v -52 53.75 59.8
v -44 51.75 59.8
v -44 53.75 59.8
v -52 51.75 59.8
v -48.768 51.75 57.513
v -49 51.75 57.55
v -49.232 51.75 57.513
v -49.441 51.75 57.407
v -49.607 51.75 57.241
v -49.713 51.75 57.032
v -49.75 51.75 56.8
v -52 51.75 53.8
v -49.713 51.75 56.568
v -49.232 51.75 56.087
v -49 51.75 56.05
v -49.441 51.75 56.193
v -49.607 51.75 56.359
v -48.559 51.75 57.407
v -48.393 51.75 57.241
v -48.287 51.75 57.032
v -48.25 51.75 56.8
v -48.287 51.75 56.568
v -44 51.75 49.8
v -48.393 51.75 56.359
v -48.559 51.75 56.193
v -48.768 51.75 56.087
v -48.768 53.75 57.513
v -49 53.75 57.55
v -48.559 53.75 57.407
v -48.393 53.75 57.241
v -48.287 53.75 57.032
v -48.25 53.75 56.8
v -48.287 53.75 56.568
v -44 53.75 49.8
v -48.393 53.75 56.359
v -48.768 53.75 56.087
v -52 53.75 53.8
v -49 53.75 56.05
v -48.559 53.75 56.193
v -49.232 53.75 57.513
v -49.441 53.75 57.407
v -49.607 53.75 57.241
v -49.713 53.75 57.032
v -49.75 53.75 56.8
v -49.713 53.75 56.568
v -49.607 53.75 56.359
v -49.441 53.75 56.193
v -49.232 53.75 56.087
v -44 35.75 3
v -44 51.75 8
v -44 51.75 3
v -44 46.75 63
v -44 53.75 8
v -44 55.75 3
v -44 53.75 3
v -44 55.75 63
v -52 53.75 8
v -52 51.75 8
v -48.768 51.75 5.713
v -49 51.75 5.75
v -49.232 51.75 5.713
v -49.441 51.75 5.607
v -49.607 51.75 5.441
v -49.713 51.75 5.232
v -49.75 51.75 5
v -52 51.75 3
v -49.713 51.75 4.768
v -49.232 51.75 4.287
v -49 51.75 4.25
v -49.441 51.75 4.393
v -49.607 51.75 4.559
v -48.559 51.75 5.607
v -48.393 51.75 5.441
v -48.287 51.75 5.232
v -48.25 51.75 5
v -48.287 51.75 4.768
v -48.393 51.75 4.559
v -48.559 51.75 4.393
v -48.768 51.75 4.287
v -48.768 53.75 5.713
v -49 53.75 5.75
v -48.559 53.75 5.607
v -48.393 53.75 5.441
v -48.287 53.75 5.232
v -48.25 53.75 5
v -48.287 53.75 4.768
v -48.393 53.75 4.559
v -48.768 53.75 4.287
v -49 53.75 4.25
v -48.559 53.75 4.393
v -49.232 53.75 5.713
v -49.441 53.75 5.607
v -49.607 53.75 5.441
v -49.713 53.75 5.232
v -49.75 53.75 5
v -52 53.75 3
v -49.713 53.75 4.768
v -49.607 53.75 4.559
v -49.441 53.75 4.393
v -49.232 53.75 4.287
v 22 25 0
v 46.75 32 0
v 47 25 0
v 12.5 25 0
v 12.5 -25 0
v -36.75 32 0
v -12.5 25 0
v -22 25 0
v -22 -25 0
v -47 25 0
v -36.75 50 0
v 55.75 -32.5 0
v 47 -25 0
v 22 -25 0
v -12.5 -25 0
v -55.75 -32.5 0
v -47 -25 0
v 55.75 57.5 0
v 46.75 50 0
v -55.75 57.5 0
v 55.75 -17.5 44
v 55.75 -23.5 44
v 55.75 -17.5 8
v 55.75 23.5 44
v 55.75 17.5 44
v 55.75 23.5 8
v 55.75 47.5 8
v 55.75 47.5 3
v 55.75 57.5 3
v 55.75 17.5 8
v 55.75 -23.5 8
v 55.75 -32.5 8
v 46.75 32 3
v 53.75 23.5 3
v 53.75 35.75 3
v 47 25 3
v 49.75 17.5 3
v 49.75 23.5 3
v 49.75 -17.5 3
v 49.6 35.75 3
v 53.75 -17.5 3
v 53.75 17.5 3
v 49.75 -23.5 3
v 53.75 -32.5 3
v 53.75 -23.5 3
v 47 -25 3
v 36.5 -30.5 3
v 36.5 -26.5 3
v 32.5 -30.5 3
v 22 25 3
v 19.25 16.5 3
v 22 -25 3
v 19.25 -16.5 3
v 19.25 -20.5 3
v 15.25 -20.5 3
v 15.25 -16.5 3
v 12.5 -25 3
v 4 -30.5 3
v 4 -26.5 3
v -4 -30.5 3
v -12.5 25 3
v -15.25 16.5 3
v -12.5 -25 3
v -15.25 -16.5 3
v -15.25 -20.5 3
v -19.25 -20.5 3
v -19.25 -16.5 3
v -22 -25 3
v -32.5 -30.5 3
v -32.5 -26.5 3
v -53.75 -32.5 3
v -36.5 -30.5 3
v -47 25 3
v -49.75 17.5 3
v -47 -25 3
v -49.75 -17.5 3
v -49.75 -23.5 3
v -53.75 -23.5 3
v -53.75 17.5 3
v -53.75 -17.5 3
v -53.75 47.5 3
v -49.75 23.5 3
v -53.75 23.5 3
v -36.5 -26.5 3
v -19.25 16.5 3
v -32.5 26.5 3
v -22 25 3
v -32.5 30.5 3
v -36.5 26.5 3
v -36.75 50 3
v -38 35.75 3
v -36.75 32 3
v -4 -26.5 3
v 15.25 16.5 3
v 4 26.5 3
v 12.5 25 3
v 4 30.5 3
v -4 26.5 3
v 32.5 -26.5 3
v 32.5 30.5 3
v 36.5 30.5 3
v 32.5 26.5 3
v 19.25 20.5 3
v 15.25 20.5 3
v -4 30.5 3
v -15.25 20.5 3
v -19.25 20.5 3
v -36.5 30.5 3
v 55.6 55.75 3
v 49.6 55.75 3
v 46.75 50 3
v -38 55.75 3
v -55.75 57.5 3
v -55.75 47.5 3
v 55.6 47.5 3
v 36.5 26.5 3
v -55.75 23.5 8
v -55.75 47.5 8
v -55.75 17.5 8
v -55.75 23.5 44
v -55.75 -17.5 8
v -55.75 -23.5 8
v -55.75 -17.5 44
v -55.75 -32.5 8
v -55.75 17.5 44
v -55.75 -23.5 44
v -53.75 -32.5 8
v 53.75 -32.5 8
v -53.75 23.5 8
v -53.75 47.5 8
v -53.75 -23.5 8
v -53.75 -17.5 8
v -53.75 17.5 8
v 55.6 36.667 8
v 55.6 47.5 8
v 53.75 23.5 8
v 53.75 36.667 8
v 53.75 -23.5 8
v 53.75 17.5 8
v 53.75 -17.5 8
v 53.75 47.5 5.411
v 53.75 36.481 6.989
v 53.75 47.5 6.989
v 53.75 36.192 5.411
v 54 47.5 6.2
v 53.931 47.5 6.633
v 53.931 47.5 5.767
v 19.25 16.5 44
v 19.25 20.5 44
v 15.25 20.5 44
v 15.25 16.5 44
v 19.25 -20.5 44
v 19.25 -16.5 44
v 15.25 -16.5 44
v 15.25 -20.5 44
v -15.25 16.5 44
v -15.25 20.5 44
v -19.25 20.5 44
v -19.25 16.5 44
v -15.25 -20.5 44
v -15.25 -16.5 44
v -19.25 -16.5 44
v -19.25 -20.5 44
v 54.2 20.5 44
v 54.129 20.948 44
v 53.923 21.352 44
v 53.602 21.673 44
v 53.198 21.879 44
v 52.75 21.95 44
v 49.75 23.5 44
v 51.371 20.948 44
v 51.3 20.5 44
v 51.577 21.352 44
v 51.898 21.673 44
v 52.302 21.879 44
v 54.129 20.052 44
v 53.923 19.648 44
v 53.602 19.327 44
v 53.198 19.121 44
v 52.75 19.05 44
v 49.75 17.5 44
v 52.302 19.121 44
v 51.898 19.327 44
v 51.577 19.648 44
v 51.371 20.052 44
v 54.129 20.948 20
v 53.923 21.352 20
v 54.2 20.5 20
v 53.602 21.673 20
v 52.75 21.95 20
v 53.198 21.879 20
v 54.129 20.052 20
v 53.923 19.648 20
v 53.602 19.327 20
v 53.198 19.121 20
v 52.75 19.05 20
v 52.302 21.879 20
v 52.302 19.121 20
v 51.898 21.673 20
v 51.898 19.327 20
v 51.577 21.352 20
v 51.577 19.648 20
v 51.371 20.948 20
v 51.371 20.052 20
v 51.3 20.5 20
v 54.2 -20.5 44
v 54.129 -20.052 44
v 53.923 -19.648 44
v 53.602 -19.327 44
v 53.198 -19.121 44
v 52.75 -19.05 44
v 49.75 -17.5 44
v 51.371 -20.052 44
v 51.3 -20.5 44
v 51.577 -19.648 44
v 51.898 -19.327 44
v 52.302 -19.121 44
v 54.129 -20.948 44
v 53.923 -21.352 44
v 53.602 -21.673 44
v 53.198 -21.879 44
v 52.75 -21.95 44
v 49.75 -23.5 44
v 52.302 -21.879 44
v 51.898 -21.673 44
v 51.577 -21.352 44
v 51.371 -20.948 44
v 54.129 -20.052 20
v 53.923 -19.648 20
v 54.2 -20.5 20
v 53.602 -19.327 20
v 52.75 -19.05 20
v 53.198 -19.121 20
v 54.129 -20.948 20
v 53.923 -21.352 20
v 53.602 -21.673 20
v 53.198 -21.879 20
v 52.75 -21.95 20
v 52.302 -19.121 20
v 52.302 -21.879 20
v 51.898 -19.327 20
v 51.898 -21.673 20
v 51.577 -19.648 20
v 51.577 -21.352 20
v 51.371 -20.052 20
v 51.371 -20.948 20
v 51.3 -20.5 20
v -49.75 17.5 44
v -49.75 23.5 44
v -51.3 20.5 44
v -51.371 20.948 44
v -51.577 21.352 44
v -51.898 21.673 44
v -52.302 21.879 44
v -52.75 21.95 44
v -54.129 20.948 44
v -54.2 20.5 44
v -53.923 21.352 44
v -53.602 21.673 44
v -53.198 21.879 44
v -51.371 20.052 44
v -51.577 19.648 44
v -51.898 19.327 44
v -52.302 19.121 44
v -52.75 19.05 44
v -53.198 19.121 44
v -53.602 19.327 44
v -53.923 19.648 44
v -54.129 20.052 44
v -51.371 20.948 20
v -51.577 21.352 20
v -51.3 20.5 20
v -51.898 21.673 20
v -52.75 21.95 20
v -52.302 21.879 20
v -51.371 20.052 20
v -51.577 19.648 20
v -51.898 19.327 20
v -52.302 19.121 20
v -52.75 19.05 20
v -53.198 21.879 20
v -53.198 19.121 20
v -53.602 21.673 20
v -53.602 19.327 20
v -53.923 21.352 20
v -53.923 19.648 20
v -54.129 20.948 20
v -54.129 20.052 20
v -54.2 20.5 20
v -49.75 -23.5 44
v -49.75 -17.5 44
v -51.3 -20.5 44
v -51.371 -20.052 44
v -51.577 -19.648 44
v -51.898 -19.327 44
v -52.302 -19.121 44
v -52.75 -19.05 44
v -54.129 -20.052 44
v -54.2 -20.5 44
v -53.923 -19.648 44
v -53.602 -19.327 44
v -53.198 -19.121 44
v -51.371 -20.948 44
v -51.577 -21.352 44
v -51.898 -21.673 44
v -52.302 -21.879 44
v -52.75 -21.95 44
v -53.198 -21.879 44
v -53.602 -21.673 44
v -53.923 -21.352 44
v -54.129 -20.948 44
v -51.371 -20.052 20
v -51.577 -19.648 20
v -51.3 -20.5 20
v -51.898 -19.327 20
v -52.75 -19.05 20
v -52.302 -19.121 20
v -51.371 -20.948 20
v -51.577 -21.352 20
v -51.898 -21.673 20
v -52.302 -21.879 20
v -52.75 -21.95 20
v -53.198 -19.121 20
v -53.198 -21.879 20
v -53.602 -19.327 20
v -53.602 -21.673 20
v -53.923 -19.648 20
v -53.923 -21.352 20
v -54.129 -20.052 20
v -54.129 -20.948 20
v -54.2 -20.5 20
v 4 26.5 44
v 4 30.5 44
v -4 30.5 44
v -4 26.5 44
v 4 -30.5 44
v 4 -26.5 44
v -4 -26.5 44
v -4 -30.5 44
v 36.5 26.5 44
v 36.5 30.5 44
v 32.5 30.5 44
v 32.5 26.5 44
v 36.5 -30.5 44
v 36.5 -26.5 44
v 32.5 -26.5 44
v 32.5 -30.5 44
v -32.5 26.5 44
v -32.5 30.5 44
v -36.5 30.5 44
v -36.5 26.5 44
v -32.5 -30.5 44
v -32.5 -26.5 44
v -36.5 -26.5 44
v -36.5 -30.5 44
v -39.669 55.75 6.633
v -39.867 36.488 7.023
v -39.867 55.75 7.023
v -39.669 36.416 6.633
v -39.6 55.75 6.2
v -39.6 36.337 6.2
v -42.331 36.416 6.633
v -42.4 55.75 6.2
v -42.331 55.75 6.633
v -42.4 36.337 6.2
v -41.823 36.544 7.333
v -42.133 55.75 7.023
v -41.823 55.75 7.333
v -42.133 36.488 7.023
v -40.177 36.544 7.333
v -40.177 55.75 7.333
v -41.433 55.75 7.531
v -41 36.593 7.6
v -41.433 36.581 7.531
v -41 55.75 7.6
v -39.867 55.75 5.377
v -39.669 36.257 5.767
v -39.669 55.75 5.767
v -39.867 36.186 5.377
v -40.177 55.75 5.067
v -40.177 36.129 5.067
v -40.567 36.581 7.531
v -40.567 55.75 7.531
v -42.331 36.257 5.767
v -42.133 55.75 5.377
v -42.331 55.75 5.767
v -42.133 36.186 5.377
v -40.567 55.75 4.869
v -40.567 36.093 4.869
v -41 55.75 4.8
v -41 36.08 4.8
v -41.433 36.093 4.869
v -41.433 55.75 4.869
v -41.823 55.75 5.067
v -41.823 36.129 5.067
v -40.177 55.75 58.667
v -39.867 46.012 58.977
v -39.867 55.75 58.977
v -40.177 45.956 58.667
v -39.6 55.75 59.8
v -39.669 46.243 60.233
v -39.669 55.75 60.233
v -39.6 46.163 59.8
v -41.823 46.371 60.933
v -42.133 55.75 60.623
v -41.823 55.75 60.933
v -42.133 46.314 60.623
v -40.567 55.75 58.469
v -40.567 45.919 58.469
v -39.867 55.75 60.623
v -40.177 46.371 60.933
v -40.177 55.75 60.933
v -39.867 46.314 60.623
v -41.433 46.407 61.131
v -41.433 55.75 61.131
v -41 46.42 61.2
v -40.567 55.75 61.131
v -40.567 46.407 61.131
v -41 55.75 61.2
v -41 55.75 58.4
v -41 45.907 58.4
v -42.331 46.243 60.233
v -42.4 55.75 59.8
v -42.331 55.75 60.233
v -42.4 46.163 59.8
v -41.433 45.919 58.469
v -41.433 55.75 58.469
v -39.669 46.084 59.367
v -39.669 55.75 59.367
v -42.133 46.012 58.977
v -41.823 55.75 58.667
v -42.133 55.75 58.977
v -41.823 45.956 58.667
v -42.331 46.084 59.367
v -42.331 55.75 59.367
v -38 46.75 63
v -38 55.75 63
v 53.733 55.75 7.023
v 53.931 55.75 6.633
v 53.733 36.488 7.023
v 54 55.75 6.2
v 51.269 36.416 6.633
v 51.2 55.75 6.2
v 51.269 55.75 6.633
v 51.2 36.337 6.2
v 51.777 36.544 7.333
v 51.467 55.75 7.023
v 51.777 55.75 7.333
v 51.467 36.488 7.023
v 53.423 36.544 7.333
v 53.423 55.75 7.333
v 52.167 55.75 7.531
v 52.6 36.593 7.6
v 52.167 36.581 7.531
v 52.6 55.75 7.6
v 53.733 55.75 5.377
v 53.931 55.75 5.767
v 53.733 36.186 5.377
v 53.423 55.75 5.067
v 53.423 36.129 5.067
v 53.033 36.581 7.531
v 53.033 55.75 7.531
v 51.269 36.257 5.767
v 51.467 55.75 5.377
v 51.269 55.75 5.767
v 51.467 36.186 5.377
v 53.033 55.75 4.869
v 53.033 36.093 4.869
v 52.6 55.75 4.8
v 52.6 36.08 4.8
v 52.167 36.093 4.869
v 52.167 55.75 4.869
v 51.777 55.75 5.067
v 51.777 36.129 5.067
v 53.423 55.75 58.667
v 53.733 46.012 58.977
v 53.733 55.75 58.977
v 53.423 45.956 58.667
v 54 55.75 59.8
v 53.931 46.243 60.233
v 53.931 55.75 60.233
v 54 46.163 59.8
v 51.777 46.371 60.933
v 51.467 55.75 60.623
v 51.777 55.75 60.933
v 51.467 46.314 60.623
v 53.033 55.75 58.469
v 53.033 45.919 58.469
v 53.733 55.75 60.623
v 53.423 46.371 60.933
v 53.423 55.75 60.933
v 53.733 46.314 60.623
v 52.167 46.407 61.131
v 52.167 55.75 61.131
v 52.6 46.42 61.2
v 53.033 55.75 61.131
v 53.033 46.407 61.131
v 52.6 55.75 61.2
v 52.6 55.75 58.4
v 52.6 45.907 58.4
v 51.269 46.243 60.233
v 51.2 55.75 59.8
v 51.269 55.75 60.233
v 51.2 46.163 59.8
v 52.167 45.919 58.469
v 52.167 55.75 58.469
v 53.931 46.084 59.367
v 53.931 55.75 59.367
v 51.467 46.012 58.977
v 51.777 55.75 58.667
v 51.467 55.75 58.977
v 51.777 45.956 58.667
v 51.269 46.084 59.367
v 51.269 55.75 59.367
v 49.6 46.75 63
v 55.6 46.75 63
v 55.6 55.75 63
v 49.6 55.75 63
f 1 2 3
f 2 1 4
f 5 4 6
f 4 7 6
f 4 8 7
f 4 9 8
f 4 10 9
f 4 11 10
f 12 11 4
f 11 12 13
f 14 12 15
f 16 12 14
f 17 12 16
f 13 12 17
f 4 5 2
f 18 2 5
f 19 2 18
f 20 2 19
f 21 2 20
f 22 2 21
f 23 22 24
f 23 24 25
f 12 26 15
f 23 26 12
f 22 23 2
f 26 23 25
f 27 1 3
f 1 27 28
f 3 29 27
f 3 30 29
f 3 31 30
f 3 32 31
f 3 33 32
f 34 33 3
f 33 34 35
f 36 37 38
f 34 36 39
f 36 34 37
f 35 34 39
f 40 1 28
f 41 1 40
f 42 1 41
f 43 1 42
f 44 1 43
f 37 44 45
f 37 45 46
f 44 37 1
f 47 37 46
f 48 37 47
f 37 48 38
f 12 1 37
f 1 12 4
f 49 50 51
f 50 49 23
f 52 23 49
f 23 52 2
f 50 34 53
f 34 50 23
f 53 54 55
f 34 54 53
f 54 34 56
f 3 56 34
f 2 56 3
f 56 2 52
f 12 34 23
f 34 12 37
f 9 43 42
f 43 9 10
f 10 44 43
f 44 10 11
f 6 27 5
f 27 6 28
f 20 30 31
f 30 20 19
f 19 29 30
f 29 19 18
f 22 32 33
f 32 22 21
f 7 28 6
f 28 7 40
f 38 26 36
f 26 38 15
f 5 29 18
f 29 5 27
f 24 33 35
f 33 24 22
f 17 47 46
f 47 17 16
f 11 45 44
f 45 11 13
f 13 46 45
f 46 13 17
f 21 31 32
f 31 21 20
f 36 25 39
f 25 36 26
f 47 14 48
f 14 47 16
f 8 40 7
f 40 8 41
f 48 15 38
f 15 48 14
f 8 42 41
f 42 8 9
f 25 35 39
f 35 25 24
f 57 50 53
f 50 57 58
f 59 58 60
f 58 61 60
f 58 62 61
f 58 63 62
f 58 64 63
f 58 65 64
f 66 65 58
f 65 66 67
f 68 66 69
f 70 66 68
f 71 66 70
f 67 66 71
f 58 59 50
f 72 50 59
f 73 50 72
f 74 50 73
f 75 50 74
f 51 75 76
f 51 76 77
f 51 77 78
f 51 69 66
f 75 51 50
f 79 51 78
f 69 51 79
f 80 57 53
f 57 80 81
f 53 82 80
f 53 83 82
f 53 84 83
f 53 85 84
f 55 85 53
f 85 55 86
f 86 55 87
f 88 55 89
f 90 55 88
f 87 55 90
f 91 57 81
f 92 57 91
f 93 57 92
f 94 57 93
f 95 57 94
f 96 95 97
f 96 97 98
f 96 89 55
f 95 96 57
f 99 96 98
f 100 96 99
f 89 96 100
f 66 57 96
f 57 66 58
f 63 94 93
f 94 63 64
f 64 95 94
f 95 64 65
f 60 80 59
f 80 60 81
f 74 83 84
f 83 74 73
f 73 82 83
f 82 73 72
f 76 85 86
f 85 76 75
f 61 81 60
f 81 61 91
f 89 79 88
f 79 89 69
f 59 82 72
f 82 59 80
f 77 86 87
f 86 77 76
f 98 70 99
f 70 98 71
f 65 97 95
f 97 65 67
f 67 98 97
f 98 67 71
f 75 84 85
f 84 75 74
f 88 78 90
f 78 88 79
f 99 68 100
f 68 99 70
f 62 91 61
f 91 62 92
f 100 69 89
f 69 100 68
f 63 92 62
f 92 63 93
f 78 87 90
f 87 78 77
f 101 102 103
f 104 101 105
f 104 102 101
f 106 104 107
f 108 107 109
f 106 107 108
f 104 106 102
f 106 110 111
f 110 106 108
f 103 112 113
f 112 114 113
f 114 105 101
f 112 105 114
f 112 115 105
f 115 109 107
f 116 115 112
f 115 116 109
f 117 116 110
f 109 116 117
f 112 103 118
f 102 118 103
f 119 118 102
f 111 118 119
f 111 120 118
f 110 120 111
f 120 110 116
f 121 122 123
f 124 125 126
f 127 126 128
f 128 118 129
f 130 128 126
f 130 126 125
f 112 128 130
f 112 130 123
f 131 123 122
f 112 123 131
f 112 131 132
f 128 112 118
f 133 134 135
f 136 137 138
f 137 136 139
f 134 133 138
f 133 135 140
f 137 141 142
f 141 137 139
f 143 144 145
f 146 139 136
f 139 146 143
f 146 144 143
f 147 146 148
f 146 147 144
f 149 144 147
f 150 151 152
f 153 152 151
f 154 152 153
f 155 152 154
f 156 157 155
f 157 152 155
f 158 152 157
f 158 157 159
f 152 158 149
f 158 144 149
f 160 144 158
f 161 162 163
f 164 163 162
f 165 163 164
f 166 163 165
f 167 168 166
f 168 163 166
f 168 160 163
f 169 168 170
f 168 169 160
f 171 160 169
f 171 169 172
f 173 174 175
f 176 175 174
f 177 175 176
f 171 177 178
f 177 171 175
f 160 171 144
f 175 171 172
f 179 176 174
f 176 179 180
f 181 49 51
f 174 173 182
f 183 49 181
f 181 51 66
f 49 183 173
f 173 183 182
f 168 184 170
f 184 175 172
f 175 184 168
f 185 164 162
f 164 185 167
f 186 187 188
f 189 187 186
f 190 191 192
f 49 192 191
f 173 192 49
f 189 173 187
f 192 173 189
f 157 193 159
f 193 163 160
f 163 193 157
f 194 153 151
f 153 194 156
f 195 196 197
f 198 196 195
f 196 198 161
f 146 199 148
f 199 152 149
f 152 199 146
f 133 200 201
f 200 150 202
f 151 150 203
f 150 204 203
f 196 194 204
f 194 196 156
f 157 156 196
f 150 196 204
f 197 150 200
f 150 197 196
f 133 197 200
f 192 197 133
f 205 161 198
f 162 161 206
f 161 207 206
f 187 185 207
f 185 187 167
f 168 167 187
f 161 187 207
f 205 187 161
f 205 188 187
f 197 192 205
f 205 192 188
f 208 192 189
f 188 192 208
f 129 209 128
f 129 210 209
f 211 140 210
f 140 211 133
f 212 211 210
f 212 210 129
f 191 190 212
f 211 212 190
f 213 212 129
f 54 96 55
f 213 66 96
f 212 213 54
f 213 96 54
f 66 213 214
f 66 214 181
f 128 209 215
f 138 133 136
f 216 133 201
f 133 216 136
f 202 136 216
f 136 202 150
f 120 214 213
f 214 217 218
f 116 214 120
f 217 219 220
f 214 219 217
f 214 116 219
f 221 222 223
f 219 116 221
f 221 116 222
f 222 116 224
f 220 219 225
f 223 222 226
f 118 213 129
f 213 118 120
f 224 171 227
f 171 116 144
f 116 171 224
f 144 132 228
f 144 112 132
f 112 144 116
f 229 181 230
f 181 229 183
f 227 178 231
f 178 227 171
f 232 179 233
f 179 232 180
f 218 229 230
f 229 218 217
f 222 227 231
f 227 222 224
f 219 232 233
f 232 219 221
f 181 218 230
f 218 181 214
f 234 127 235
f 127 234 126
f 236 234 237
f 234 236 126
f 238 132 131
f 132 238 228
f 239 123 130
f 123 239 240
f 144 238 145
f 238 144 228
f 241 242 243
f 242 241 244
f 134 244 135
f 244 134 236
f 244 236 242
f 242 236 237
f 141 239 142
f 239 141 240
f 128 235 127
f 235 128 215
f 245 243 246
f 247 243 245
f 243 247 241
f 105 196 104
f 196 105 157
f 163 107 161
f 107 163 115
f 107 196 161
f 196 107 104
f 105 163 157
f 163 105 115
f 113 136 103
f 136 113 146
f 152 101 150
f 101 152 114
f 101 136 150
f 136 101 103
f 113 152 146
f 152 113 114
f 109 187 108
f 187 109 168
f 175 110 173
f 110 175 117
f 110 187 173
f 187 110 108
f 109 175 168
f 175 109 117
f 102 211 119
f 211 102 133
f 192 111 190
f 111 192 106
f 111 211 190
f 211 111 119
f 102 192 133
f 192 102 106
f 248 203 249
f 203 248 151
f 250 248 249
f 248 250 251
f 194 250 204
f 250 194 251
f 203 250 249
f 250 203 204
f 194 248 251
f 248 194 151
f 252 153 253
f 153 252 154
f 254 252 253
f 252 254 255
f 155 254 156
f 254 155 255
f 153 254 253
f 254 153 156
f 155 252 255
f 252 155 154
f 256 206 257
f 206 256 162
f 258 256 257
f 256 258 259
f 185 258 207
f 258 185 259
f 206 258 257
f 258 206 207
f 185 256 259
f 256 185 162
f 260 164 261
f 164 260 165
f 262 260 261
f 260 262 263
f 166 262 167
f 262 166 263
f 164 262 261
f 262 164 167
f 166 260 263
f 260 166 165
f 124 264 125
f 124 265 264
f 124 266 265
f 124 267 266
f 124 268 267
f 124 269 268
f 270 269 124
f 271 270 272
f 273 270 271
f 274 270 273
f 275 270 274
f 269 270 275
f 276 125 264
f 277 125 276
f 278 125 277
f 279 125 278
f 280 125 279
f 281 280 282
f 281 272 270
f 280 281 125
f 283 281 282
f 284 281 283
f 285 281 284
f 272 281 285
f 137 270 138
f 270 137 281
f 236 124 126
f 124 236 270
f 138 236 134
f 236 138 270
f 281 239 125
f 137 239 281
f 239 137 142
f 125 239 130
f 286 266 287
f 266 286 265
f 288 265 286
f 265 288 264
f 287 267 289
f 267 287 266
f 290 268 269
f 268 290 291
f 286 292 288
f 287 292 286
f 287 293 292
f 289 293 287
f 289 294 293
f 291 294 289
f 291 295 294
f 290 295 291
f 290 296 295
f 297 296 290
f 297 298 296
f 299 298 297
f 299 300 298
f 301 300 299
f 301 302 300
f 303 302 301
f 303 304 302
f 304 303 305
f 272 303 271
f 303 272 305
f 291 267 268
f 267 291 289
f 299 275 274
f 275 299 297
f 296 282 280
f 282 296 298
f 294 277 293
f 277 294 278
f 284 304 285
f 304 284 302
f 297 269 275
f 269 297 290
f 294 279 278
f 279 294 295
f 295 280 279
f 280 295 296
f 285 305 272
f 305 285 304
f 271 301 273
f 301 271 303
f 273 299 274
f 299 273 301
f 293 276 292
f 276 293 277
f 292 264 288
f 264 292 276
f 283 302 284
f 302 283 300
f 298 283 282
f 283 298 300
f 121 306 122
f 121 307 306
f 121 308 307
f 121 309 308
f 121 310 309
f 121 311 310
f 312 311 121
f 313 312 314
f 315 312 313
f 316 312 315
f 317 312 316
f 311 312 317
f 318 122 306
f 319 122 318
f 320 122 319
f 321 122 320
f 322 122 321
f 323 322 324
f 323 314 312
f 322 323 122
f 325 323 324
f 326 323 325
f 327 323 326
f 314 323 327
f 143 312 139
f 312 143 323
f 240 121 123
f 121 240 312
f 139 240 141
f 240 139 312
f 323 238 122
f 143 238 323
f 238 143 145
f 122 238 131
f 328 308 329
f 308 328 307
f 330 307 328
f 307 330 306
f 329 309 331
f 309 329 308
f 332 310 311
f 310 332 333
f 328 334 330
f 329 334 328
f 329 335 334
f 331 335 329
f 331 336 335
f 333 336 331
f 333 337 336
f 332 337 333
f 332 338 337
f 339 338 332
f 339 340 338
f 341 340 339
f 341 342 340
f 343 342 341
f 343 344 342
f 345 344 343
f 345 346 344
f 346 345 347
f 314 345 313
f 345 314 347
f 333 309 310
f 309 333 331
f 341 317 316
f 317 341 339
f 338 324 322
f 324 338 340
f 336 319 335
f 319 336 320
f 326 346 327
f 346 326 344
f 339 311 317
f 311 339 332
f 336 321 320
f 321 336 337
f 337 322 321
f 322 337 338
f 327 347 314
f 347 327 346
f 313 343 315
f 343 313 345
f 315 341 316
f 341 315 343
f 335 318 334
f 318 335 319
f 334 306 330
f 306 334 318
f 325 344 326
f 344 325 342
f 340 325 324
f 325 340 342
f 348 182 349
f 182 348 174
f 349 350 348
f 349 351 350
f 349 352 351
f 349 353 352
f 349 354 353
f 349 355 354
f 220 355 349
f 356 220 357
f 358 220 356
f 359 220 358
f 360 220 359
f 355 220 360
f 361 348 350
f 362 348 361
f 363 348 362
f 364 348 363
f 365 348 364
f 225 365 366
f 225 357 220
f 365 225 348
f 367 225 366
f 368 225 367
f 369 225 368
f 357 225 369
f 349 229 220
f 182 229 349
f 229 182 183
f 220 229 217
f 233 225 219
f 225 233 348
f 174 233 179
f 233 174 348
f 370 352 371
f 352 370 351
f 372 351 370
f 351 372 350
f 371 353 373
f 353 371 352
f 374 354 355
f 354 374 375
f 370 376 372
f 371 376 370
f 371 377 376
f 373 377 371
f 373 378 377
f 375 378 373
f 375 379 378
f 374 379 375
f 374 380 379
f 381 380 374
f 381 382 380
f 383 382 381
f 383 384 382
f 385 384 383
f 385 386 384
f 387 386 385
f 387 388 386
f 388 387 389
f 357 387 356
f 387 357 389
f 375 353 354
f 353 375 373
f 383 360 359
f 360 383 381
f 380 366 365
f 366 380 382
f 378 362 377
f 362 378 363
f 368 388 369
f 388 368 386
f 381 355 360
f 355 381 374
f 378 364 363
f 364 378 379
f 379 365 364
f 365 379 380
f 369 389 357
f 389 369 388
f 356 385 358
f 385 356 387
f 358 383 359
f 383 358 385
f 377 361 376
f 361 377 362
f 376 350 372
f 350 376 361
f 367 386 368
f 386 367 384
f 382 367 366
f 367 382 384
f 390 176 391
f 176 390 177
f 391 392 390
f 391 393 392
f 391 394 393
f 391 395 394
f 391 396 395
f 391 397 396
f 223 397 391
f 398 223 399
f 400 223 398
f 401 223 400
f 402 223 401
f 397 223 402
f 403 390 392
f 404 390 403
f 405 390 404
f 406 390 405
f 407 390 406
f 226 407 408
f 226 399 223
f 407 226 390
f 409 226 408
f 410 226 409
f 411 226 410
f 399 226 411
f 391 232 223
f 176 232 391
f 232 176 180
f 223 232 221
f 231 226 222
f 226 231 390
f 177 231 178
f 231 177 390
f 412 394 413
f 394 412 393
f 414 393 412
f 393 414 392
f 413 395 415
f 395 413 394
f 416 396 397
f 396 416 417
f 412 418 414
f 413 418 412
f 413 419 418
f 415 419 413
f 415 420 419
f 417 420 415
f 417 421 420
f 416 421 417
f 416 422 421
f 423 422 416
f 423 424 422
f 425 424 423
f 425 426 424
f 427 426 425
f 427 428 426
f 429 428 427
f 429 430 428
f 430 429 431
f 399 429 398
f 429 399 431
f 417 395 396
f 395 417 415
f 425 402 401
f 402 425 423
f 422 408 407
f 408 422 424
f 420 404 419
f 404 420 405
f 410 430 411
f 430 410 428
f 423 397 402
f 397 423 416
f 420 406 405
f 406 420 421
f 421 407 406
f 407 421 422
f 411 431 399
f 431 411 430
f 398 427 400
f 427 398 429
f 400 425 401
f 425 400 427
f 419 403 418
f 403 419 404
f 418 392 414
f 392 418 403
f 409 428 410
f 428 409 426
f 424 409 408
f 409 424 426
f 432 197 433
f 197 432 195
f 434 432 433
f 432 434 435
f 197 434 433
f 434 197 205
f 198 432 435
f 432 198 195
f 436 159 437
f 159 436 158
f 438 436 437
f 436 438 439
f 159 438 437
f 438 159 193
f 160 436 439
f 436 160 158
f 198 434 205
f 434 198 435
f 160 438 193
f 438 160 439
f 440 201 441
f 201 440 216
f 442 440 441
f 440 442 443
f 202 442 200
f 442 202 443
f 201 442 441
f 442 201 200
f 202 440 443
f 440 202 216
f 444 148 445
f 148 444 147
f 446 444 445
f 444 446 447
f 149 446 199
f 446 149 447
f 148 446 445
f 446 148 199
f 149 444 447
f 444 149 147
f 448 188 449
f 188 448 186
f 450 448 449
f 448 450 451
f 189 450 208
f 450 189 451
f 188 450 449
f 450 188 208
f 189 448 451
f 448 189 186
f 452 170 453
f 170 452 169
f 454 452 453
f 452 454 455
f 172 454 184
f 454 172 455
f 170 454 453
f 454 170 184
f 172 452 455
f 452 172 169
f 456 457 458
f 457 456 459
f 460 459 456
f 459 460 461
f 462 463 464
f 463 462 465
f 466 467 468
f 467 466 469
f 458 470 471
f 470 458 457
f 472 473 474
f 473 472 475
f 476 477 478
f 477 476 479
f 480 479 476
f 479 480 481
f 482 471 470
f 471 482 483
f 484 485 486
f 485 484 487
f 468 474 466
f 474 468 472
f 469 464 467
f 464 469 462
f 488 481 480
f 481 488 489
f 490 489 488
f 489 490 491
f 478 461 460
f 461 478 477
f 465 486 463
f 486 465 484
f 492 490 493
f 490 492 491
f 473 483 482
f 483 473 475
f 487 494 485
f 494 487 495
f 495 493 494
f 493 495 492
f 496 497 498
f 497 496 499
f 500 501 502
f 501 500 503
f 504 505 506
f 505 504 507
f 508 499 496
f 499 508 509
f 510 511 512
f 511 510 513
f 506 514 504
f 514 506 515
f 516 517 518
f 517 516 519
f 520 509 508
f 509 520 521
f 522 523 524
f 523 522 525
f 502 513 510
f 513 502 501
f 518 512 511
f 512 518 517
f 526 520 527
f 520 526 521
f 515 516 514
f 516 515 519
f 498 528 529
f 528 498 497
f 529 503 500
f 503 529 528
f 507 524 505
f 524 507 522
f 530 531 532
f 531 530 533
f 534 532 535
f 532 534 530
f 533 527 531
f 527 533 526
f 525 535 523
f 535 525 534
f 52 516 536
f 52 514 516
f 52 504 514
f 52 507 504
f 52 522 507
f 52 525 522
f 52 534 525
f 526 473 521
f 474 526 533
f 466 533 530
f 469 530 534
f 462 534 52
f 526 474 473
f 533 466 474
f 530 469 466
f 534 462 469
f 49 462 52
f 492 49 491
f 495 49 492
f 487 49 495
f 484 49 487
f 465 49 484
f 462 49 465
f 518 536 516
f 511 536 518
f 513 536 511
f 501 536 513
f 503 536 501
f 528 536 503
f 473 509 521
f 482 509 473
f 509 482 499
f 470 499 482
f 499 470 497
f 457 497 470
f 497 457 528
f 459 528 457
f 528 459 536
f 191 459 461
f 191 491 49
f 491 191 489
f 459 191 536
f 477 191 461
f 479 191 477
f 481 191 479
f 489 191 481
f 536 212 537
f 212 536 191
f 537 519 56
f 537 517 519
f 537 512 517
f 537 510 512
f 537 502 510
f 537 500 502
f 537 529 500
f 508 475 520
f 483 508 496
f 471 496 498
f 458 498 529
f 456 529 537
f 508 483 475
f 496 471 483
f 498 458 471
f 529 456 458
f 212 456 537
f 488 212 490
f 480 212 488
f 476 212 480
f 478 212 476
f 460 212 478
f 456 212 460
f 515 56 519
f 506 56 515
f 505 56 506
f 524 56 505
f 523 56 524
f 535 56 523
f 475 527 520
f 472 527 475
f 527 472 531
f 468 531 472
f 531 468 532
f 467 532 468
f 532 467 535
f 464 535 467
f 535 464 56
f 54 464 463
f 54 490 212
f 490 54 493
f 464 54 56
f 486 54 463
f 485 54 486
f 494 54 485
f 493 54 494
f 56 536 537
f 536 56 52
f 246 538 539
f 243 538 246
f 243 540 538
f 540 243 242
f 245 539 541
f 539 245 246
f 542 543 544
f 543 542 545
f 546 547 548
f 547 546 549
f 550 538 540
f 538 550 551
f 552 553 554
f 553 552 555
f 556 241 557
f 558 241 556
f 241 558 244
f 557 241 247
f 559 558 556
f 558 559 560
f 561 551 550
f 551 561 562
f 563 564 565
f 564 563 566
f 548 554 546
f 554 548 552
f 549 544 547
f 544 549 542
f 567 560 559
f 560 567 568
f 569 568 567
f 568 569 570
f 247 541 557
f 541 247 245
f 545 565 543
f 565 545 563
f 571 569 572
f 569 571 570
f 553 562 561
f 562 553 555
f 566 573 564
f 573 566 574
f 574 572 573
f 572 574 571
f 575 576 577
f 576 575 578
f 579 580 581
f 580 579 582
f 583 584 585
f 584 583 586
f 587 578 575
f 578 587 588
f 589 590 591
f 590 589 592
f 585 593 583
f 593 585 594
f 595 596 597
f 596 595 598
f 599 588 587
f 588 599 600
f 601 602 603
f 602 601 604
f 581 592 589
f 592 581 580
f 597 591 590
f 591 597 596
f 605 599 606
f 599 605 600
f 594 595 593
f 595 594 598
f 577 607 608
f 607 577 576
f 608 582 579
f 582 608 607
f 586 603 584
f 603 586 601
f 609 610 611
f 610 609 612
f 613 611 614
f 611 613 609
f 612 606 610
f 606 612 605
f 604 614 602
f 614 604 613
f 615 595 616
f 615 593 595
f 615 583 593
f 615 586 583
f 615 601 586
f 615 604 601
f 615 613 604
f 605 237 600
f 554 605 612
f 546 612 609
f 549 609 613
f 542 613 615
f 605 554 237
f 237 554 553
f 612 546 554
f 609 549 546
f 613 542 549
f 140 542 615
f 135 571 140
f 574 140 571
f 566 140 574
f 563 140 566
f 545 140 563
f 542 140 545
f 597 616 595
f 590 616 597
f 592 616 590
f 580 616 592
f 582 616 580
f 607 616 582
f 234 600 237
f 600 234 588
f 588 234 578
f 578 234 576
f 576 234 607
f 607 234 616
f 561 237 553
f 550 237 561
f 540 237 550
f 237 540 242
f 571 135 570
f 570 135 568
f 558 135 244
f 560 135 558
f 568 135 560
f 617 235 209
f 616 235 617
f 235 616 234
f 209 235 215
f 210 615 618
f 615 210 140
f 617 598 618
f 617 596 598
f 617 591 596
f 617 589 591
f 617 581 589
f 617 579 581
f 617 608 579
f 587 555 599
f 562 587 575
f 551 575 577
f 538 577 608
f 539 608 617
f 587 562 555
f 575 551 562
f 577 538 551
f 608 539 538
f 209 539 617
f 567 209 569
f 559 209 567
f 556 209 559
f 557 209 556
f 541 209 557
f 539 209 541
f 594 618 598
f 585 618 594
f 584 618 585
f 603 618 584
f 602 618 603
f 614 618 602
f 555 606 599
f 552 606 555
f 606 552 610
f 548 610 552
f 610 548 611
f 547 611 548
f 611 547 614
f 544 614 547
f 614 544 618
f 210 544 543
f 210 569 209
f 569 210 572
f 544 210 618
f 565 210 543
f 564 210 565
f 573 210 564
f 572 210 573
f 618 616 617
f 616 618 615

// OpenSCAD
/* File: ~/GliderWinchItems/BMS/hw/proxy2.scad
  * frame for proxy pack 650 mah batteries
  * Latest edit: 20230215
 */
 
 $fn=20;
  
module rounded_rectangle_hull(wid,slen,ht,rad)
{
 hull()
 {    
    translate([-wid/2+rad,rad,0])
        cylinder(r=rad,h=ht,center=false);

   translate([ wid/2-rad,rad,0])
        cylinder(r=rad,h=ht,center=false);

    translate([-wid/2+rad,slen-rad,0])
        cylinder(r=rad,h=ht,center=false);
    
    translate([ wid/2-rad,slen-rad,0])
        cylinder(r=rad,h=ht,center=false);
 }
}
blen = 53.0; // Battery length
bwid = 30.5; // Battery width
bthk =  7.0; // Battery thickness
bipst = 4.0; // Inner posts between batterys stacks
bepst = 6.0; // End posts 
bhpst = bthk*6 + 2.0;// Post height
pcbwid = 25; // pcb mounting space

len = bwid*3 + 2*bipst + 2*bepst;
wid = blen + 2*bepst + pcbwid ;
ht = bhpst;;
wall = 3;
bot = 3;

psq = 6.0;
pht = ht - 0; // Post height
phole = 48;//54;

module post(a,xht,sq,da)
{
    translate(a)
    {
        difference()
        {
            union()
            {
                translate([0,0,xht/2])
                cube([sq,sq,xht],center = true);
            }
            union()
            {
                translate([0,0,xht-24])
                cylinder(d=da,h=25, center=false);
            }
        }
    }
}
pcboff = 3.2;    
pcby2 = 60  - pcboff;
pcby1 = pcboff;
pcbdia = 2.8;
module postpcb(a)
{

   
    translate(a)
    {
      difference()
    {
        union()
        {
          translate([0,0,bot])
          rotate([90,0,-90])
           linear_extrude(height = 6, center = true, convexity = 10, twist = 0)
             polygon(points=[[0,0],[0,60],[9,60],[20,0]]);

 
        }
        union()
        {
            translate([0,0,pcboff+bot])
            rotate([90,0,0])
            cylinder(d=pcbdia,h=100,center=true);
            
            translate([0,0,pcboff+bot+(60-2*pcboff)])
            rotate([90,0,0])
            cylinder(d=pcbdia,h=100,center=true);
            

        }
    }
}
}

module box()
{
    del1 = 2.8;
    difference()
    {
        union()
        {
            translate([0,pcbwid/2,bot/2])
            cube([len,wid,bot],center = true);
            
            translate([-len/2+1,7.5,8/2])
            cube([2,80,8],center=true);
            
            translate([ len/2-1,7.5,8/2])
            cube([2,80,8],center=true);
 
        }
        union()
        {
            qlen = 25; qwid = 50;
           translate([0,0,0])
            cube([qlen,qwid,100],center = true); 
           translate([bwid*1+bipst,0,0])
            cube([qlen,qwid,100],center = true);  
            translate([-(bwid*1+bipst),0,0])
            cube([qlen,qwid,100],center = true); 
  
            rlen = len-28; rwid = 18;
            translate([5,wid/2-4,0])
            cube([rlen,rwid,100],center = true); 
            
 
        }
    }
}
pdel = 6;
poff = bwid/2 + bipst/2;
py2 = blen/2 - bipst/2 - pdel;
px3 = bwid*1.5 + bipst + bepst/2;
py3 = blen/2 -pdel;
px4 = 0 + bipst/2;
py4 = blen/2 + bipst/2;

module boxNpost()
{
box();
post([ poff, py2,0],pht,bipst,0);
post([ poff,-py2,0],pht,bipst,0);
post([-poff, py2,0],pht,bipst,0);
post([-poff,-py2,0],pht,bipst,0);

post([ px3, py3,0],ht,bepst,2.9);
post([ px3,-py3,0],ht,bepst,2.9);
post([-px3, py3,0],ht,bepst,2.9);
post([-px3,-py3,0],ht,bepst,2.9);

post([ px4, py4,0],ht,bipst,0);
post([ px4,-py4,0],ht,bipst,0);
post([-px4, py4,0],ht,bipst,0);
post([-px4,-py4,0],ht,bipst,0);

px5 = bwid* 1 + bipst; 
post([ px5, py4,0],ht,bipst,0);
post([ px5,-py4,0],ht,bipst,0);
post([-px5, py4,0],ht,bipst,0);
post([-px5,-py4,0],ht,bipst,0);
}

module senseRtab(a,dd,rr)
{
    zh = 2;
    z2 = 8;
    z1 = z2+zh;    
    z3 = z2/2;
    translate(a)
    {
      rotate([0,0, rr])
      rotate([90,0,0])
      rotate([0,90,0])
      {
        difference()
        {
        union()
        {
          linear_extrude(height = zh, center = false, convexity = 10, twist = 0)
          polygon(points=[[0,0],[0,z1],[z2,z1],[z2,z3]]);
        }
        union()
        {
            translate([z2/2+1,z1-3,0])
            cylinder(d=dd,h=50,center=true);
        }
       }
     }
    }
}
frame = 1;
if (frame==1)
{

// 0.1 ohm current sense resistor mounting tabs
senseRtab([-50+9-3,len/2-2-2,pcboff+bot+(60-2*pcboff-10)],1.5,90);
difference()
{    
  senseRtab([-50+9-3,len/2-2-2,-2],1.5,90);
  translate([0,0,-1])cube([200,200,2],center=true);
}

boxNpost();

translate([-50+9,len/2,0])
union()
{
  postpcb([  0,0,0]);
  postpcb([(100-2*pcboff),0,0]);
}
}

module clamp()
{
 del2 = -5;
    cht = 5;
 difference()
 {
     union()
     {
        translate([0,0,ht/2])
        cube([2*(px3+2.9),2*(py3+2.9),cht],center = true);
     }
     union()
     {
       cube([2*(px3-2.9),2*(py3-2.9),50],center = true);
         
       translate([ px3, py3,0]) cylinder(d=3.2,h=60);       
       translate([-px3, py3,0]) cylinder(d=3.2,h=60);       
       translate([ px3,-py3,0]) cylinder(d=3.2,h=60);       
       translate([-px3,-py3,0]) cylinder(d=3.2,h=60);       
     }
 }   
}

//translate([0,0,35])clamp();
